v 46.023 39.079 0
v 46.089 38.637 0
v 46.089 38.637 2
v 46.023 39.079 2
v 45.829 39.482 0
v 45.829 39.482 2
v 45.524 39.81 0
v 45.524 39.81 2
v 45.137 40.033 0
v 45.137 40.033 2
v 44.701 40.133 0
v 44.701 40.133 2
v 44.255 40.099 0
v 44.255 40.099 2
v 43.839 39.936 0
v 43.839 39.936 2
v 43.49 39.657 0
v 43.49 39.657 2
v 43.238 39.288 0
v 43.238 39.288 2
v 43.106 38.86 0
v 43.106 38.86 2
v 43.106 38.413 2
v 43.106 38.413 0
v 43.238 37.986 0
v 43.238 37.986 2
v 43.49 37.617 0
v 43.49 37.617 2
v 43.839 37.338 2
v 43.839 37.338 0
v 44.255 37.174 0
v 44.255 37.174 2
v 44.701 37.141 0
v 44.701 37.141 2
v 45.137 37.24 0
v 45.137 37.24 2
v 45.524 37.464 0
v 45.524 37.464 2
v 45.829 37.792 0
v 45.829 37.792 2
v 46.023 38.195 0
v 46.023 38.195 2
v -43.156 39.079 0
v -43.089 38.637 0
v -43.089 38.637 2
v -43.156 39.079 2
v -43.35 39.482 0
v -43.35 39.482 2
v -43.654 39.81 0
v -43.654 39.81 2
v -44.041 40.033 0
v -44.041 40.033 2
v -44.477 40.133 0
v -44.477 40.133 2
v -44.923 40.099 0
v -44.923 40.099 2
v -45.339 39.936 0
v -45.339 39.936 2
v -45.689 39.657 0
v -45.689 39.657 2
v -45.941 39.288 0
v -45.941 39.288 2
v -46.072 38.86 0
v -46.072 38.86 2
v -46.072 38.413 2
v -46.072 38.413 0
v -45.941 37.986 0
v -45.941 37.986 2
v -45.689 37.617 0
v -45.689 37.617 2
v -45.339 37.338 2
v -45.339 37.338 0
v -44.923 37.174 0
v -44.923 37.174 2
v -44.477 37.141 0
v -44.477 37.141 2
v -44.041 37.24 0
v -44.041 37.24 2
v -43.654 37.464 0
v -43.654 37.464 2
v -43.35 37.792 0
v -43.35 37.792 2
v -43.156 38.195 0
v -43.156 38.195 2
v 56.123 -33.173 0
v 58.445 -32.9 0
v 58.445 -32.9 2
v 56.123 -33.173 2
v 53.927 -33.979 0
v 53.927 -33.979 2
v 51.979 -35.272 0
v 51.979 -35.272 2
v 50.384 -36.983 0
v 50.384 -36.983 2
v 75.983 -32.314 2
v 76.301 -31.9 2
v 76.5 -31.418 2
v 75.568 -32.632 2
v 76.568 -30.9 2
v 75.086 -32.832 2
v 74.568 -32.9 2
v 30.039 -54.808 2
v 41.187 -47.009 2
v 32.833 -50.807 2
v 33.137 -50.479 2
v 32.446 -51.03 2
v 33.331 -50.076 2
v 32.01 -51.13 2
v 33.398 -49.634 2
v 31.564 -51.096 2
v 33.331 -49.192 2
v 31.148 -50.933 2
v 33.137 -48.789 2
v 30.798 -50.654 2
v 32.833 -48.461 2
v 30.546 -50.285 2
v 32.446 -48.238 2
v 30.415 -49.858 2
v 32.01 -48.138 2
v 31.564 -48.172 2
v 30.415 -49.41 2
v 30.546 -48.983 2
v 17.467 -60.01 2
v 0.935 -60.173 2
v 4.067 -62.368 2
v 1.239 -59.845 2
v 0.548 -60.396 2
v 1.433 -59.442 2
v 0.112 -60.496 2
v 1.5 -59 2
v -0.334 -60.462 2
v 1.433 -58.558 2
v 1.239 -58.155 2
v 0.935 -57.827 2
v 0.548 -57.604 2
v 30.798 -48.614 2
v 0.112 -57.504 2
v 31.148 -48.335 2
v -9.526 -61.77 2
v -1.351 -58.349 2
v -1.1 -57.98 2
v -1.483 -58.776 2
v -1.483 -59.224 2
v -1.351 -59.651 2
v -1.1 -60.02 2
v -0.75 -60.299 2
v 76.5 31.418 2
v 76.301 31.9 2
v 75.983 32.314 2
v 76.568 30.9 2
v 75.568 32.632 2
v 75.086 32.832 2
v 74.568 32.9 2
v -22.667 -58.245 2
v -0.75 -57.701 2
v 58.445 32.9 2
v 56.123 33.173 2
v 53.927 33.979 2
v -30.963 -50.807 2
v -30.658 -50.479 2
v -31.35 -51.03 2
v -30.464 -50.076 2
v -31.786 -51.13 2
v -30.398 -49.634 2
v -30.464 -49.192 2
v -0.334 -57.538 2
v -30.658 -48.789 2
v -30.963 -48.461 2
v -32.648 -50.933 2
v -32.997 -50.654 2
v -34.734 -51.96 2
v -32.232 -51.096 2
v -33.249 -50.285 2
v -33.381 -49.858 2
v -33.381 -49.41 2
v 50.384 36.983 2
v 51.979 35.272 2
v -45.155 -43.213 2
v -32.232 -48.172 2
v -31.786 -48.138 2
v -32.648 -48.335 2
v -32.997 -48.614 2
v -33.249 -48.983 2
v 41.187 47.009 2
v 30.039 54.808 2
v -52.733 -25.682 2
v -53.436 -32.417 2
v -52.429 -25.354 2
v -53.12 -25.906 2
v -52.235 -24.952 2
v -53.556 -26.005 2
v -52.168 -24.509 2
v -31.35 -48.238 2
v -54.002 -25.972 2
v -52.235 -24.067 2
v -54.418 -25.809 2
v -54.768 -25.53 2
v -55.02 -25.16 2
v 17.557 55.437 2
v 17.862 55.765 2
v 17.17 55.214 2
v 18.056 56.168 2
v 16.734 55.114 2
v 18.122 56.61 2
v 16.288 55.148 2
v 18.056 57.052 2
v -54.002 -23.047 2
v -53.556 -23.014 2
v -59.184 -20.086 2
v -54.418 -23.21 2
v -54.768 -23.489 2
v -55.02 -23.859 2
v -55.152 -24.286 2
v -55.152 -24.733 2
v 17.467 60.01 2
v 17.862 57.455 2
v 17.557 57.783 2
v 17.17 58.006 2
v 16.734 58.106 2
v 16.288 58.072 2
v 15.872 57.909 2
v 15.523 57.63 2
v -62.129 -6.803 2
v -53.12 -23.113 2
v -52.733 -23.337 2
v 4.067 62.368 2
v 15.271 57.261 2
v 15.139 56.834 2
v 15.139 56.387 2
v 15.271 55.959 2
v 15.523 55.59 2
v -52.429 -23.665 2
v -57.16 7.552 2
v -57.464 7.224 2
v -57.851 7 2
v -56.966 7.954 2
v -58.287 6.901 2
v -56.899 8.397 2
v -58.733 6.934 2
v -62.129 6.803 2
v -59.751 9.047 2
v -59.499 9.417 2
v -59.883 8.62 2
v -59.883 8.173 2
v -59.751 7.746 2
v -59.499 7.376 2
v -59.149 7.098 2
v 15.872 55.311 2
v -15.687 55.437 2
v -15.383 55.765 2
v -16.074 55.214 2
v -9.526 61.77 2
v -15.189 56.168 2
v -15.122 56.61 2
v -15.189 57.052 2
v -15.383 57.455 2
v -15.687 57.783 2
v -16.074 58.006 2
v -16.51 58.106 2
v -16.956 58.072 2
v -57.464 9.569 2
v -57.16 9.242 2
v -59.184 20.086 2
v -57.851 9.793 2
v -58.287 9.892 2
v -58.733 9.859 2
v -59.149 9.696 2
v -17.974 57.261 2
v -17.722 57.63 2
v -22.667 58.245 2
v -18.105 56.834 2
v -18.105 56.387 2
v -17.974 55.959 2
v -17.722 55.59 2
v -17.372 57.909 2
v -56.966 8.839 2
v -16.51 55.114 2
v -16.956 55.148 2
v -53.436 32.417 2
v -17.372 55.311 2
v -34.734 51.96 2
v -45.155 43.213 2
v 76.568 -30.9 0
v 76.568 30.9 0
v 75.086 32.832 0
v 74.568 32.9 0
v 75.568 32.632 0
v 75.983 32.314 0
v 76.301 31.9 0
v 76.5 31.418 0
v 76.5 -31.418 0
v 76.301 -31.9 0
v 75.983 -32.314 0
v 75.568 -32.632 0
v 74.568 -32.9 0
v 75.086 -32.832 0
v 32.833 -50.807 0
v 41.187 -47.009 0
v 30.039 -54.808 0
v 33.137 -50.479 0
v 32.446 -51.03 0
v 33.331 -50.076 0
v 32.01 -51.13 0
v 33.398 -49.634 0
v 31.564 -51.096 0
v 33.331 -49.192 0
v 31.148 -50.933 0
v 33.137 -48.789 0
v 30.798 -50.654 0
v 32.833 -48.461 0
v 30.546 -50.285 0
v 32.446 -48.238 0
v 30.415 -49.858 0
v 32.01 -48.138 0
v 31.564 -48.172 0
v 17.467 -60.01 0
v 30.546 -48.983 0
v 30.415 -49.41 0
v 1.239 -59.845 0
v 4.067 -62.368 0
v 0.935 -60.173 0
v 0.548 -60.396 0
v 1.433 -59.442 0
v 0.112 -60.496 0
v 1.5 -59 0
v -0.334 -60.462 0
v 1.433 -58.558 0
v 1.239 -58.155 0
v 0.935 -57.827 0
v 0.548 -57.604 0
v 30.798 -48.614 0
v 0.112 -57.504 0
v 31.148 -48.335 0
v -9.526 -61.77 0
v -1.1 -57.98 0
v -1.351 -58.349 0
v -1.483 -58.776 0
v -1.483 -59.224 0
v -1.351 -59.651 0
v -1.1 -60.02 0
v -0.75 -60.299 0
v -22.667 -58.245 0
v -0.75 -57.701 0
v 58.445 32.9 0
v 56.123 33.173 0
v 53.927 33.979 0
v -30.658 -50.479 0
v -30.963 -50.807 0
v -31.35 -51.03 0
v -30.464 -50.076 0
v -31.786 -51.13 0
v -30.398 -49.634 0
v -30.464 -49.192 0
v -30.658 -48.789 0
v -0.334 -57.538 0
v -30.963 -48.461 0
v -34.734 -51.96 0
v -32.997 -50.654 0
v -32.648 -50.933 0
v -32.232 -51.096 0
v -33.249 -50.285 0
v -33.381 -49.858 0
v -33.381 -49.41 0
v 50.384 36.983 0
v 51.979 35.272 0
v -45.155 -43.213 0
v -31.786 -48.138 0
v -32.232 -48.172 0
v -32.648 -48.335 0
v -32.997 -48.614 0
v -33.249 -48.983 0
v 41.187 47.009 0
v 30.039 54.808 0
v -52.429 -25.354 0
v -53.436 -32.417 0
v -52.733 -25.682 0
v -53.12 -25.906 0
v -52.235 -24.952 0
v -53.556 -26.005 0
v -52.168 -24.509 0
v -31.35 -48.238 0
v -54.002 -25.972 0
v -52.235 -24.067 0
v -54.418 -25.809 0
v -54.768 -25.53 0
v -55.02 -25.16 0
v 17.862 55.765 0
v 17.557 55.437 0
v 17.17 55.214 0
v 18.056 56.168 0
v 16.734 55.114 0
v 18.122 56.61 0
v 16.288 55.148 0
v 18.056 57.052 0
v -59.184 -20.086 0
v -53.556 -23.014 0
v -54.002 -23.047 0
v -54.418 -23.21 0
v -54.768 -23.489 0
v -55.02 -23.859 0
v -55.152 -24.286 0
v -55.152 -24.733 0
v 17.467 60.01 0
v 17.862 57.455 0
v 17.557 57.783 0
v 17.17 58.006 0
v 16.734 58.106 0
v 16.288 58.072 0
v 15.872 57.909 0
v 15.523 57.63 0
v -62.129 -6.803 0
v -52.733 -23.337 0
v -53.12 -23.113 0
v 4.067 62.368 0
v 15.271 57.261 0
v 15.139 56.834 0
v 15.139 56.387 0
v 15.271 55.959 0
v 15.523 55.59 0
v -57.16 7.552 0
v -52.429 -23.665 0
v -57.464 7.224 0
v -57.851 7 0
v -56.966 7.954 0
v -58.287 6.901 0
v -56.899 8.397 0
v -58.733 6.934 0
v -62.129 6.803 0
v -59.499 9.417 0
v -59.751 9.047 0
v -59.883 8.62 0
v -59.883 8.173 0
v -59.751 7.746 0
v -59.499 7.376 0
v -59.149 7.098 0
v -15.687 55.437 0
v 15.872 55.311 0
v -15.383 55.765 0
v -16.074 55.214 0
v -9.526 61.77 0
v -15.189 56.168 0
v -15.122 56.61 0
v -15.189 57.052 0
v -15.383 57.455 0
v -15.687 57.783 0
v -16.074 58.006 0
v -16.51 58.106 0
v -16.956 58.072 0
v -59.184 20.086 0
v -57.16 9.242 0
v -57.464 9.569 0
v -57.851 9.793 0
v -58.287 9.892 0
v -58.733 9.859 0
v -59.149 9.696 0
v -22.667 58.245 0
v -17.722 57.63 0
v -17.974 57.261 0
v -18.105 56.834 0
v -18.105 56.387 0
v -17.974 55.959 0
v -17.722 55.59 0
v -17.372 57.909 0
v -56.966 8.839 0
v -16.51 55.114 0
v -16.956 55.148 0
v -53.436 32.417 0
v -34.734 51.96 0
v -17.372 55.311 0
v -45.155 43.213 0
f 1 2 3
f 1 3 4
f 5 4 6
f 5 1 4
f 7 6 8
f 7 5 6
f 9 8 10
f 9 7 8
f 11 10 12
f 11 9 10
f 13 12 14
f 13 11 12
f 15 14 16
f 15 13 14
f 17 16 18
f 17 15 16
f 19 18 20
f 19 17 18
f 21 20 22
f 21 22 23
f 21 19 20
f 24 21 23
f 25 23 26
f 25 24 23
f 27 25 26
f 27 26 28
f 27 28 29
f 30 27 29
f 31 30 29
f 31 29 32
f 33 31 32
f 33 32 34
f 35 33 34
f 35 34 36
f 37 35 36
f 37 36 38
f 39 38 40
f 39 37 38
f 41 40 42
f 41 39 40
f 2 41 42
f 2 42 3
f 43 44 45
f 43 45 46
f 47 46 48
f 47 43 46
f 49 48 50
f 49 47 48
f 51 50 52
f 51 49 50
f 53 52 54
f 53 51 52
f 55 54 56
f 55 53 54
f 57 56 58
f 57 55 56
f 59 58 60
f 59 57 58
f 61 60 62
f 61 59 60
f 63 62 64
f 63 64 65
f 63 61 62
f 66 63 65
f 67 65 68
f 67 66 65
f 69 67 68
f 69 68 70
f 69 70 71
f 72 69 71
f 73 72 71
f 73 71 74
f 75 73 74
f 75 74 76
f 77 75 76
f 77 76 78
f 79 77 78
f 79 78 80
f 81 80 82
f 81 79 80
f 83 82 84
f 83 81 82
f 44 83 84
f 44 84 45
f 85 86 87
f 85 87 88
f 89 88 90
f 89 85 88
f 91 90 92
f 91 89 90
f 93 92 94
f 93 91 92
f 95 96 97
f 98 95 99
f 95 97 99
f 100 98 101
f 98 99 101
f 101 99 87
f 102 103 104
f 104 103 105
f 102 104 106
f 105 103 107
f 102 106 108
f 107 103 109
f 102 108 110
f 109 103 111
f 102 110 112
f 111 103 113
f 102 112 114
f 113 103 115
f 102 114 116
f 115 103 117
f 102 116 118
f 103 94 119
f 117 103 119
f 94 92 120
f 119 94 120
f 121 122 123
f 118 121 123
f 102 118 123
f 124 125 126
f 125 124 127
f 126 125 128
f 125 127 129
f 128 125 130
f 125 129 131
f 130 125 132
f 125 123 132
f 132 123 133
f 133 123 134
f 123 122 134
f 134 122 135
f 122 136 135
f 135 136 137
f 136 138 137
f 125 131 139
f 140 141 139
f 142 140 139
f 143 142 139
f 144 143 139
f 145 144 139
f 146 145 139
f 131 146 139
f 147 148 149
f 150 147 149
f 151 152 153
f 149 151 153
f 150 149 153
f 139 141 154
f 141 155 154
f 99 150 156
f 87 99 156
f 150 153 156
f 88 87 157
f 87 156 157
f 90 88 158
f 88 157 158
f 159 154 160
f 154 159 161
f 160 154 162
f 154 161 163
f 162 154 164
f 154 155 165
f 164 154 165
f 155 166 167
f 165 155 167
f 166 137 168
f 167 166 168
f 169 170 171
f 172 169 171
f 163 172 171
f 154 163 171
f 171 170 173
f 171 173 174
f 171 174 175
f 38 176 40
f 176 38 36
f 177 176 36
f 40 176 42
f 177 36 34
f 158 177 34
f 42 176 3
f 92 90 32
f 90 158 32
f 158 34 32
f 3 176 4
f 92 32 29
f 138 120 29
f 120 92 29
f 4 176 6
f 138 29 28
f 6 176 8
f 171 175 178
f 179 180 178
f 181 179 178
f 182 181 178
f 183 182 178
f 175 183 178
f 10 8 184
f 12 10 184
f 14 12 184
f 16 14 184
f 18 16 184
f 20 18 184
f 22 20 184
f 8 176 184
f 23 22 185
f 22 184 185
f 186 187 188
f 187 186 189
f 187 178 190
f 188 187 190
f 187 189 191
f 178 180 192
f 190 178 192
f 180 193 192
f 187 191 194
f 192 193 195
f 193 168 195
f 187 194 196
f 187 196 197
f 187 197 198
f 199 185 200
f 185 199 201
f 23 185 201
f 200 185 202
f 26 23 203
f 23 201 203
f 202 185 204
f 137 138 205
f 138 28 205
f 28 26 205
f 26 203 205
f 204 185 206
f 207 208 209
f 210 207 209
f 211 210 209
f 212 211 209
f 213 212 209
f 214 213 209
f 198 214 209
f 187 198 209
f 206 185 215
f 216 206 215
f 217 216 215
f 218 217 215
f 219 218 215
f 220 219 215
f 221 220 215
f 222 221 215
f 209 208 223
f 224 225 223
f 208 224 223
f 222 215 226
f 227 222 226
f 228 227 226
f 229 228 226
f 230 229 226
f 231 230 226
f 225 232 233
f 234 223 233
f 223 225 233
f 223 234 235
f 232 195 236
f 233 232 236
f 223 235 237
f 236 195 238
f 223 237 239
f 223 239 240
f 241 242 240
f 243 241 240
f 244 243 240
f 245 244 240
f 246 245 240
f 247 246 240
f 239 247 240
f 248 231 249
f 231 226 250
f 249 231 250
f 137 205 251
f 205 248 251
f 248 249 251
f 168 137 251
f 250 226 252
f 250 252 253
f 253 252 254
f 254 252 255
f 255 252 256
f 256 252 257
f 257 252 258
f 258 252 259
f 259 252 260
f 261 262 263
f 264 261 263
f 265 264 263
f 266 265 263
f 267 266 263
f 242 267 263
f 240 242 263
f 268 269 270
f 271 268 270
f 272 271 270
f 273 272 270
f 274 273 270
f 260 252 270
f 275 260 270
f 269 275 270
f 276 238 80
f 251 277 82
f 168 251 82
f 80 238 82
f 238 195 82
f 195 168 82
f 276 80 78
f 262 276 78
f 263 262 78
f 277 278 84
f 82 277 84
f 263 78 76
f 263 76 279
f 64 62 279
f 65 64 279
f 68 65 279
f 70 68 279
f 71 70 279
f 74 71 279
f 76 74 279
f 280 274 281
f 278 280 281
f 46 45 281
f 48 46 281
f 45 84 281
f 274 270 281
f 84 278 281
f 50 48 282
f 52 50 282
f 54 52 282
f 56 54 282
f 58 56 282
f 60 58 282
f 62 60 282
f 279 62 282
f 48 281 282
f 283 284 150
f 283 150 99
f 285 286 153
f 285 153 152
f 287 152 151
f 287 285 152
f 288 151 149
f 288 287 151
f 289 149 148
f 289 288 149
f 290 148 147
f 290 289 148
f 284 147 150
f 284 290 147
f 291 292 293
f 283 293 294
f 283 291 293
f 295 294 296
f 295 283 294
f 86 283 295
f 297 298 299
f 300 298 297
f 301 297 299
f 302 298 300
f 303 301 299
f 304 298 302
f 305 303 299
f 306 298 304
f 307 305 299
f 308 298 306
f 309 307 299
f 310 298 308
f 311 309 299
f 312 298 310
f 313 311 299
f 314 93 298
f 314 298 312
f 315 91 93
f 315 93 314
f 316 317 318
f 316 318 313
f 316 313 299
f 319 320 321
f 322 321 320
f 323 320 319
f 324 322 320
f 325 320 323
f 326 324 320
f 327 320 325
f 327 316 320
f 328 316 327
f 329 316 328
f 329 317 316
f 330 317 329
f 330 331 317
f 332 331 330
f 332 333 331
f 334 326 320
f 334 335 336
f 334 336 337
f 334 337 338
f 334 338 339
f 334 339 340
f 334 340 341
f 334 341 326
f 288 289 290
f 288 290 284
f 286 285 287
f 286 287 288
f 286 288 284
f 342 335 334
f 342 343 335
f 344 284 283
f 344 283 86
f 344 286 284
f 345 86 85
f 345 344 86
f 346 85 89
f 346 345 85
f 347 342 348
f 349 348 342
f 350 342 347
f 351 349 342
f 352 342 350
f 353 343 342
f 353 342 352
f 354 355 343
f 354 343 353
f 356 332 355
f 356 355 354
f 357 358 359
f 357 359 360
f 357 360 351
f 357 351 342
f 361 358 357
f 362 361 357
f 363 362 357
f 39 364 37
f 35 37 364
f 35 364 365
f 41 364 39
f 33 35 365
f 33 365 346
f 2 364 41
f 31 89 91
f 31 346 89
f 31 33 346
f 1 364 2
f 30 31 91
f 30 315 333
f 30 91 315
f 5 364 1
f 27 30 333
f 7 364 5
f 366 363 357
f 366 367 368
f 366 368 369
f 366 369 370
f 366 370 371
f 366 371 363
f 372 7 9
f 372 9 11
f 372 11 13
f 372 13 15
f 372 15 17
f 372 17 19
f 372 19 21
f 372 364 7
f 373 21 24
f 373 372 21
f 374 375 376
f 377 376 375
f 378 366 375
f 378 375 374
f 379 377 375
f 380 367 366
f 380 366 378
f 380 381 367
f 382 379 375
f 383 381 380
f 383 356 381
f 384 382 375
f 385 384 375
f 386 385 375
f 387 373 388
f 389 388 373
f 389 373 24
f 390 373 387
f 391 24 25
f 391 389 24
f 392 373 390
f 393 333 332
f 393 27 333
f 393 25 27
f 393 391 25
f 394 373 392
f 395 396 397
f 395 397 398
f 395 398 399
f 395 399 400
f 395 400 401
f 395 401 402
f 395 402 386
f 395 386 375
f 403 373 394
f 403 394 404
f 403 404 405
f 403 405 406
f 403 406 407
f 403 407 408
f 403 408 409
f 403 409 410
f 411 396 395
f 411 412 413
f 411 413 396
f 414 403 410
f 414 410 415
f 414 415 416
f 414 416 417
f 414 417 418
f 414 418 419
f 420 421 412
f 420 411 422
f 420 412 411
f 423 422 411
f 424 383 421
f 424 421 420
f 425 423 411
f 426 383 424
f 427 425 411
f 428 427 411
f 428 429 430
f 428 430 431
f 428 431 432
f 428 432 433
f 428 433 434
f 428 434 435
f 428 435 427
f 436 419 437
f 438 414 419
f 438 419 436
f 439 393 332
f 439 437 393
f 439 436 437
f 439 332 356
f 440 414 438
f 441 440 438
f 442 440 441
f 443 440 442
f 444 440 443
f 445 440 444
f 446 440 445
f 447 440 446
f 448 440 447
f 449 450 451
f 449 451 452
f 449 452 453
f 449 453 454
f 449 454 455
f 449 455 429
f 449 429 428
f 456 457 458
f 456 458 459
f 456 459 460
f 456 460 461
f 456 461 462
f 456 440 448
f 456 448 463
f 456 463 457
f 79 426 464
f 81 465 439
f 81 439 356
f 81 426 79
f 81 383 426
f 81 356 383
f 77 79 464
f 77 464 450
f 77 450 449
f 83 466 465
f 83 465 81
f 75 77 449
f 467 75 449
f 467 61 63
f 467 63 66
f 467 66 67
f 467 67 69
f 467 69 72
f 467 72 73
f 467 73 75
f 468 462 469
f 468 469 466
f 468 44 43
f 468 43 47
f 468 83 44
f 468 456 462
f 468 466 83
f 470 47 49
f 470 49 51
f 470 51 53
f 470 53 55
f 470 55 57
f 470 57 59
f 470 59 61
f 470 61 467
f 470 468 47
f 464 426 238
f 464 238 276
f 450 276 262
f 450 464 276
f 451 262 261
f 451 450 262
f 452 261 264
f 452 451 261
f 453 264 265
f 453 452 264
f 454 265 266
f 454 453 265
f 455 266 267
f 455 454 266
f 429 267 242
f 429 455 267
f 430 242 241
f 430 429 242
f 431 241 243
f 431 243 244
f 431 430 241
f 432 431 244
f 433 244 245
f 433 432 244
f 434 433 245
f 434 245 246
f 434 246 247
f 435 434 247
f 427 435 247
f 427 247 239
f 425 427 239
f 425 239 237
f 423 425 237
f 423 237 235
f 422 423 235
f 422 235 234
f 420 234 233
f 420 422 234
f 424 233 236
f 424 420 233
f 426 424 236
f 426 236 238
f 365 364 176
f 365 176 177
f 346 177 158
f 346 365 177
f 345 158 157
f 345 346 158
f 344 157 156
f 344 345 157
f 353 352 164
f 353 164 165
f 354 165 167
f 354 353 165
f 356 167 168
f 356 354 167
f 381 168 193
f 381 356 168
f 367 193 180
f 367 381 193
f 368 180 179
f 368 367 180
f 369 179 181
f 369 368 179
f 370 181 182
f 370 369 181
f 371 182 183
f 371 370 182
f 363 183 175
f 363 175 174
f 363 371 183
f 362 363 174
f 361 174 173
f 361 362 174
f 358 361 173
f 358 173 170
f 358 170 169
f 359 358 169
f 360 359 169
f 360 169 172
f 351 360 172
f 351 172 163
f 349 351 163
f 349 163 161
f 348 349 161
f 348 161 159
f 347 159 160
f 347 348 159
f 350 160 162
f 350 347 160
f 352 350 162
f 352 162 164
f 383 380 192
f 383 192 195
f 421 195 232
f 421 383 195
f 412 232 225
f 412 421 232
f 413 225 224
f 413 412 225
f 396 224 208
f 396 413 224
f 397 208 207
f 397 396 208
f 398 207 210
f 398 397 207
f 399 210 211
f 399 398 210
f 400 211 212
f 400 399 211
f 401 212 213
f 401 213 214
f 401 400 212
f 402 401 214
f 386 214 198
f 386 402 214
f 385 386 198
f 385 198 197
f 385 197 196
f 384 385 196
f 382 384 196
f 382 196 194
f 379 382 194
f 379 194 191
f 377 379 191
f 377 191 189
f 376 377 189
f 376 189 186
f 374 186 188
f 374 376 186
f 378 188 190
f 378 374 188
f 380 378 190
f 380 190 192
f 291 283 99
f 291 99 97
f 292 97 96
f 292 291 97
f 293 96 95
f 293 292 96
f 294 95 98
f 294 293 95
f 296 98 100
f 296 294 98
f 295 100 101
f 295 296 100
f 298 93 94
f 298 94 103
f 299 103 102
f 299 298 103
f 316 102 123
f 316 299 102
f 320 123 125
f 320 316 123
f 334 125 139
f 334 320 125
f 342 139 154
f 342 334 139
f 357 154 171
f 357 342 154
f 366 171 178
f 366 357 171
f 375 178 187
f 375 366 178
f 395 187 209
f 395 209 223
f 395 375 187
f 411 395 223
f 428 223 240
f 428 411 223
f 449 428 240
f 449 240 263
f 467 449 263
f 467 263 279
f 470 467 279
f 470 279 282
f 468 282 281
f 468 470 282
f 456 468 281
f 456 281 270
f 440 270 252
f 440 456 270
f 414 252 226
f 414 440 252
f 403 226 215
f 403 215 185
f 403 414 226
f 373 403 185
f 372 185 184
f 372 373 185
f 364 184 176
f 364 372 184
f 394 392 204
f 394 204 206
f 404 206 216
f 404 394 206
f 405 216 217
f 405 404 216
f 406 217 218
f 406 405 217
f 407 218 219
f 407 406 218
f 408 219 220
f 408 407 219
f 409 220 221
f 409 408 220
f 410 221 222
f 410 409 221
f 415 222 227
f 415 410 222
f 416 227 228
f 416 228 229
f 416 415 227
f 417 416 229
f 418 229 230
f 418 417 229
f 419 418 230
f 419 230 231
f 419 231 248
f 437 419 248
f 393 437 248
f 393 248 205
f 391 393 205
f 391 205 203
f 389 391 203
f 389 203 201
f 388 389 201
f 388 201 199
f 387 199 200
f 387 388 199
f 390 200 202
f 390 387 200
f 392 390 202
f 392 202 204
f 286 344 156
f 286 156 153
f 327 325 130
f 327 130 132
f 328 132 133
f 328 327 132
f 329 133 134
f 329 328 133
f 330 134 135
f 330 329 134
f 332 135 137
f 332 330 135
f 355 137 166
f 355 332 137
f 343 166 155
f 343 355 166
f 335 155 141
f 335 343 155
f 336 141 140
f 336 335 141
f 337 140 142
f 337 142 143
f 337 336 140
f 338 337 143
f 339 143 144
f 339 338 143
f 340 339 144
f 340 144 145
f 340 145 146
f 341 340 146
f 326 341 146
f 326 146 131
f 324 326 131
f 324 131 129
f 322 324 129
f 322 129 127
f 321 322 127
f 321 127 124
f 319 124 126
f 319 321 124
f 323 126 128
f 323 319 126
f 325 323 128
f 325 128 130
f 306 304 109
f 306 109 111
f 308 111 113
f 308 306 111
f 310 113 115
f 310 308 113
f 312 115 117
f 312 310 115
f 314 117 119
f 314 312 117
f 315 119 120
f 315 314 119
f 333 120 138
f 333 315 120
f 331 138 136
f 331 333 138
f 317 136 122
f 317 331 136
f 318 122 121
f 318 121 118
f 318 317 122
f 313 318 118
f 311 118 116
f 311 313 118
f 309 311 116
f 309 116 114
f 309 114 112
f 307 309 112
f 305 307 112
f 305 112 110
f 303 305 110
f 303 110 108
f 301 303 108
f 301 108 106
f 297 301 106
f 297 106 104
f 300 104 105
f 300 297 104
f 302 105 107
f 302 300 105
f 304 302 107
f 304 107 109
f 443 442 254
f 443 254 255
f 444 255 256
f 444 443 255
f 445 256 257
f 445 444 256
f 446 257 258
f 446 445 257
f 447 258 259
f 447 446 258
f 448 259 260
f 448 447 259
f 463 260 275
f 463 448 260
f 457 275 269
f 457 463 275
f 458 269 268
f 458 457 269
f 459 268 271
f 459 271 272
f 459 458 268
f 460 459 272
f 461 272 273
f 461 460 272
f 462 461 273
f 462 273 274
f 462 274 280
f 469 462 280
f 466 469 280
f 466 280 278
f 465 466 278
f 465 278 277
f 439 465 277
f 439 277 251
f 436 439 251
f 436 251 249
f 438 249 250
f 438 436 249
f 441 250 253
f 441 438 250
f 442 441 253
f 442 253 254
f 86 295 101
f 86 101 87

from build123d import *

# Parameters (mm, degrees)
SKETCH_1_R      = 1.5
EXTRUDE_1_DEPTH = 2


with BuildPart() as part:
    # 草图1 → 凸台-拉伸1 (new body)
    with BuildSketch(Plane.XY):
        with BuildLine():
            Line((58.445187997, 32.9), (74.5685, 32.9))
            ThreePointArc((74.5685, 32.9), (75.982713562, 32.314213562), (76.5685, 30.9))
            Line((76.5685, 30.9), (76.5685, -30.9))
            ThreePointArc((76.5685, -30.9), (75.982713562, -32.314213562), (74.5685, -32.9))
            Line((74.5685, -32.9), (58.445187997, -32.9))
            ThreePointArc((58.445187997, -32.9), (53.927025417, -33.978889817), (50.383782756, -36.982758621))
            ThreePointArc((50.383782756, -36.982758621), (-62.5, 0), (50.383782756, 36.982758621))
            ThreePointArc((50.383782756, 36.982758621), (53.927025417, 33.978889817), (58.445187997, 32.9))
        make_face()
        with Locations((0, -59)):
            Circle(SKETCH_1_R, mode=Mode.SUBTRACT)
        with Locations((-31.89780823, -49.633958437)):
            Circle(SKETCH_1_R, mode=Mode.SUBTRACT)
        with Locations((-53.668287726, -24.509485767)):
            Circle(SKETCH_1_R, mode=Mode.SUBTRACT)
        with Locations((-58.399465071, 8.396575458)):
            Circle(SKETCH_1_R, mode=Mode.SUBTRACT)
        with Locations((-44.589224887, 38.636783303)):
            Circle(SKETCH_1_R, mode=Mode.SUBTRACT)
        with Locations((-16.622220854, 56.610085443)):
            Circle(SKETCH_1_R, mode=Mode.SUBTRACT)
        with Locations((16.622220854, 56.610085443)):
            Circle(SKETCH_1_R, mode=Mode.SUBTRACT)
        with Locations((44.589224887, 38.636783303)):
            Circle(SKETCH_1_R, mode=Mode.SUBTRACT)
        with Locations((31.89780823, -49.633958437)):
            Circle(SKETCH_1_R, mode=Mode.SUBTRACT)
    extrude(amount=EXTRUDE_1_DEPTH)


solid = part.part
